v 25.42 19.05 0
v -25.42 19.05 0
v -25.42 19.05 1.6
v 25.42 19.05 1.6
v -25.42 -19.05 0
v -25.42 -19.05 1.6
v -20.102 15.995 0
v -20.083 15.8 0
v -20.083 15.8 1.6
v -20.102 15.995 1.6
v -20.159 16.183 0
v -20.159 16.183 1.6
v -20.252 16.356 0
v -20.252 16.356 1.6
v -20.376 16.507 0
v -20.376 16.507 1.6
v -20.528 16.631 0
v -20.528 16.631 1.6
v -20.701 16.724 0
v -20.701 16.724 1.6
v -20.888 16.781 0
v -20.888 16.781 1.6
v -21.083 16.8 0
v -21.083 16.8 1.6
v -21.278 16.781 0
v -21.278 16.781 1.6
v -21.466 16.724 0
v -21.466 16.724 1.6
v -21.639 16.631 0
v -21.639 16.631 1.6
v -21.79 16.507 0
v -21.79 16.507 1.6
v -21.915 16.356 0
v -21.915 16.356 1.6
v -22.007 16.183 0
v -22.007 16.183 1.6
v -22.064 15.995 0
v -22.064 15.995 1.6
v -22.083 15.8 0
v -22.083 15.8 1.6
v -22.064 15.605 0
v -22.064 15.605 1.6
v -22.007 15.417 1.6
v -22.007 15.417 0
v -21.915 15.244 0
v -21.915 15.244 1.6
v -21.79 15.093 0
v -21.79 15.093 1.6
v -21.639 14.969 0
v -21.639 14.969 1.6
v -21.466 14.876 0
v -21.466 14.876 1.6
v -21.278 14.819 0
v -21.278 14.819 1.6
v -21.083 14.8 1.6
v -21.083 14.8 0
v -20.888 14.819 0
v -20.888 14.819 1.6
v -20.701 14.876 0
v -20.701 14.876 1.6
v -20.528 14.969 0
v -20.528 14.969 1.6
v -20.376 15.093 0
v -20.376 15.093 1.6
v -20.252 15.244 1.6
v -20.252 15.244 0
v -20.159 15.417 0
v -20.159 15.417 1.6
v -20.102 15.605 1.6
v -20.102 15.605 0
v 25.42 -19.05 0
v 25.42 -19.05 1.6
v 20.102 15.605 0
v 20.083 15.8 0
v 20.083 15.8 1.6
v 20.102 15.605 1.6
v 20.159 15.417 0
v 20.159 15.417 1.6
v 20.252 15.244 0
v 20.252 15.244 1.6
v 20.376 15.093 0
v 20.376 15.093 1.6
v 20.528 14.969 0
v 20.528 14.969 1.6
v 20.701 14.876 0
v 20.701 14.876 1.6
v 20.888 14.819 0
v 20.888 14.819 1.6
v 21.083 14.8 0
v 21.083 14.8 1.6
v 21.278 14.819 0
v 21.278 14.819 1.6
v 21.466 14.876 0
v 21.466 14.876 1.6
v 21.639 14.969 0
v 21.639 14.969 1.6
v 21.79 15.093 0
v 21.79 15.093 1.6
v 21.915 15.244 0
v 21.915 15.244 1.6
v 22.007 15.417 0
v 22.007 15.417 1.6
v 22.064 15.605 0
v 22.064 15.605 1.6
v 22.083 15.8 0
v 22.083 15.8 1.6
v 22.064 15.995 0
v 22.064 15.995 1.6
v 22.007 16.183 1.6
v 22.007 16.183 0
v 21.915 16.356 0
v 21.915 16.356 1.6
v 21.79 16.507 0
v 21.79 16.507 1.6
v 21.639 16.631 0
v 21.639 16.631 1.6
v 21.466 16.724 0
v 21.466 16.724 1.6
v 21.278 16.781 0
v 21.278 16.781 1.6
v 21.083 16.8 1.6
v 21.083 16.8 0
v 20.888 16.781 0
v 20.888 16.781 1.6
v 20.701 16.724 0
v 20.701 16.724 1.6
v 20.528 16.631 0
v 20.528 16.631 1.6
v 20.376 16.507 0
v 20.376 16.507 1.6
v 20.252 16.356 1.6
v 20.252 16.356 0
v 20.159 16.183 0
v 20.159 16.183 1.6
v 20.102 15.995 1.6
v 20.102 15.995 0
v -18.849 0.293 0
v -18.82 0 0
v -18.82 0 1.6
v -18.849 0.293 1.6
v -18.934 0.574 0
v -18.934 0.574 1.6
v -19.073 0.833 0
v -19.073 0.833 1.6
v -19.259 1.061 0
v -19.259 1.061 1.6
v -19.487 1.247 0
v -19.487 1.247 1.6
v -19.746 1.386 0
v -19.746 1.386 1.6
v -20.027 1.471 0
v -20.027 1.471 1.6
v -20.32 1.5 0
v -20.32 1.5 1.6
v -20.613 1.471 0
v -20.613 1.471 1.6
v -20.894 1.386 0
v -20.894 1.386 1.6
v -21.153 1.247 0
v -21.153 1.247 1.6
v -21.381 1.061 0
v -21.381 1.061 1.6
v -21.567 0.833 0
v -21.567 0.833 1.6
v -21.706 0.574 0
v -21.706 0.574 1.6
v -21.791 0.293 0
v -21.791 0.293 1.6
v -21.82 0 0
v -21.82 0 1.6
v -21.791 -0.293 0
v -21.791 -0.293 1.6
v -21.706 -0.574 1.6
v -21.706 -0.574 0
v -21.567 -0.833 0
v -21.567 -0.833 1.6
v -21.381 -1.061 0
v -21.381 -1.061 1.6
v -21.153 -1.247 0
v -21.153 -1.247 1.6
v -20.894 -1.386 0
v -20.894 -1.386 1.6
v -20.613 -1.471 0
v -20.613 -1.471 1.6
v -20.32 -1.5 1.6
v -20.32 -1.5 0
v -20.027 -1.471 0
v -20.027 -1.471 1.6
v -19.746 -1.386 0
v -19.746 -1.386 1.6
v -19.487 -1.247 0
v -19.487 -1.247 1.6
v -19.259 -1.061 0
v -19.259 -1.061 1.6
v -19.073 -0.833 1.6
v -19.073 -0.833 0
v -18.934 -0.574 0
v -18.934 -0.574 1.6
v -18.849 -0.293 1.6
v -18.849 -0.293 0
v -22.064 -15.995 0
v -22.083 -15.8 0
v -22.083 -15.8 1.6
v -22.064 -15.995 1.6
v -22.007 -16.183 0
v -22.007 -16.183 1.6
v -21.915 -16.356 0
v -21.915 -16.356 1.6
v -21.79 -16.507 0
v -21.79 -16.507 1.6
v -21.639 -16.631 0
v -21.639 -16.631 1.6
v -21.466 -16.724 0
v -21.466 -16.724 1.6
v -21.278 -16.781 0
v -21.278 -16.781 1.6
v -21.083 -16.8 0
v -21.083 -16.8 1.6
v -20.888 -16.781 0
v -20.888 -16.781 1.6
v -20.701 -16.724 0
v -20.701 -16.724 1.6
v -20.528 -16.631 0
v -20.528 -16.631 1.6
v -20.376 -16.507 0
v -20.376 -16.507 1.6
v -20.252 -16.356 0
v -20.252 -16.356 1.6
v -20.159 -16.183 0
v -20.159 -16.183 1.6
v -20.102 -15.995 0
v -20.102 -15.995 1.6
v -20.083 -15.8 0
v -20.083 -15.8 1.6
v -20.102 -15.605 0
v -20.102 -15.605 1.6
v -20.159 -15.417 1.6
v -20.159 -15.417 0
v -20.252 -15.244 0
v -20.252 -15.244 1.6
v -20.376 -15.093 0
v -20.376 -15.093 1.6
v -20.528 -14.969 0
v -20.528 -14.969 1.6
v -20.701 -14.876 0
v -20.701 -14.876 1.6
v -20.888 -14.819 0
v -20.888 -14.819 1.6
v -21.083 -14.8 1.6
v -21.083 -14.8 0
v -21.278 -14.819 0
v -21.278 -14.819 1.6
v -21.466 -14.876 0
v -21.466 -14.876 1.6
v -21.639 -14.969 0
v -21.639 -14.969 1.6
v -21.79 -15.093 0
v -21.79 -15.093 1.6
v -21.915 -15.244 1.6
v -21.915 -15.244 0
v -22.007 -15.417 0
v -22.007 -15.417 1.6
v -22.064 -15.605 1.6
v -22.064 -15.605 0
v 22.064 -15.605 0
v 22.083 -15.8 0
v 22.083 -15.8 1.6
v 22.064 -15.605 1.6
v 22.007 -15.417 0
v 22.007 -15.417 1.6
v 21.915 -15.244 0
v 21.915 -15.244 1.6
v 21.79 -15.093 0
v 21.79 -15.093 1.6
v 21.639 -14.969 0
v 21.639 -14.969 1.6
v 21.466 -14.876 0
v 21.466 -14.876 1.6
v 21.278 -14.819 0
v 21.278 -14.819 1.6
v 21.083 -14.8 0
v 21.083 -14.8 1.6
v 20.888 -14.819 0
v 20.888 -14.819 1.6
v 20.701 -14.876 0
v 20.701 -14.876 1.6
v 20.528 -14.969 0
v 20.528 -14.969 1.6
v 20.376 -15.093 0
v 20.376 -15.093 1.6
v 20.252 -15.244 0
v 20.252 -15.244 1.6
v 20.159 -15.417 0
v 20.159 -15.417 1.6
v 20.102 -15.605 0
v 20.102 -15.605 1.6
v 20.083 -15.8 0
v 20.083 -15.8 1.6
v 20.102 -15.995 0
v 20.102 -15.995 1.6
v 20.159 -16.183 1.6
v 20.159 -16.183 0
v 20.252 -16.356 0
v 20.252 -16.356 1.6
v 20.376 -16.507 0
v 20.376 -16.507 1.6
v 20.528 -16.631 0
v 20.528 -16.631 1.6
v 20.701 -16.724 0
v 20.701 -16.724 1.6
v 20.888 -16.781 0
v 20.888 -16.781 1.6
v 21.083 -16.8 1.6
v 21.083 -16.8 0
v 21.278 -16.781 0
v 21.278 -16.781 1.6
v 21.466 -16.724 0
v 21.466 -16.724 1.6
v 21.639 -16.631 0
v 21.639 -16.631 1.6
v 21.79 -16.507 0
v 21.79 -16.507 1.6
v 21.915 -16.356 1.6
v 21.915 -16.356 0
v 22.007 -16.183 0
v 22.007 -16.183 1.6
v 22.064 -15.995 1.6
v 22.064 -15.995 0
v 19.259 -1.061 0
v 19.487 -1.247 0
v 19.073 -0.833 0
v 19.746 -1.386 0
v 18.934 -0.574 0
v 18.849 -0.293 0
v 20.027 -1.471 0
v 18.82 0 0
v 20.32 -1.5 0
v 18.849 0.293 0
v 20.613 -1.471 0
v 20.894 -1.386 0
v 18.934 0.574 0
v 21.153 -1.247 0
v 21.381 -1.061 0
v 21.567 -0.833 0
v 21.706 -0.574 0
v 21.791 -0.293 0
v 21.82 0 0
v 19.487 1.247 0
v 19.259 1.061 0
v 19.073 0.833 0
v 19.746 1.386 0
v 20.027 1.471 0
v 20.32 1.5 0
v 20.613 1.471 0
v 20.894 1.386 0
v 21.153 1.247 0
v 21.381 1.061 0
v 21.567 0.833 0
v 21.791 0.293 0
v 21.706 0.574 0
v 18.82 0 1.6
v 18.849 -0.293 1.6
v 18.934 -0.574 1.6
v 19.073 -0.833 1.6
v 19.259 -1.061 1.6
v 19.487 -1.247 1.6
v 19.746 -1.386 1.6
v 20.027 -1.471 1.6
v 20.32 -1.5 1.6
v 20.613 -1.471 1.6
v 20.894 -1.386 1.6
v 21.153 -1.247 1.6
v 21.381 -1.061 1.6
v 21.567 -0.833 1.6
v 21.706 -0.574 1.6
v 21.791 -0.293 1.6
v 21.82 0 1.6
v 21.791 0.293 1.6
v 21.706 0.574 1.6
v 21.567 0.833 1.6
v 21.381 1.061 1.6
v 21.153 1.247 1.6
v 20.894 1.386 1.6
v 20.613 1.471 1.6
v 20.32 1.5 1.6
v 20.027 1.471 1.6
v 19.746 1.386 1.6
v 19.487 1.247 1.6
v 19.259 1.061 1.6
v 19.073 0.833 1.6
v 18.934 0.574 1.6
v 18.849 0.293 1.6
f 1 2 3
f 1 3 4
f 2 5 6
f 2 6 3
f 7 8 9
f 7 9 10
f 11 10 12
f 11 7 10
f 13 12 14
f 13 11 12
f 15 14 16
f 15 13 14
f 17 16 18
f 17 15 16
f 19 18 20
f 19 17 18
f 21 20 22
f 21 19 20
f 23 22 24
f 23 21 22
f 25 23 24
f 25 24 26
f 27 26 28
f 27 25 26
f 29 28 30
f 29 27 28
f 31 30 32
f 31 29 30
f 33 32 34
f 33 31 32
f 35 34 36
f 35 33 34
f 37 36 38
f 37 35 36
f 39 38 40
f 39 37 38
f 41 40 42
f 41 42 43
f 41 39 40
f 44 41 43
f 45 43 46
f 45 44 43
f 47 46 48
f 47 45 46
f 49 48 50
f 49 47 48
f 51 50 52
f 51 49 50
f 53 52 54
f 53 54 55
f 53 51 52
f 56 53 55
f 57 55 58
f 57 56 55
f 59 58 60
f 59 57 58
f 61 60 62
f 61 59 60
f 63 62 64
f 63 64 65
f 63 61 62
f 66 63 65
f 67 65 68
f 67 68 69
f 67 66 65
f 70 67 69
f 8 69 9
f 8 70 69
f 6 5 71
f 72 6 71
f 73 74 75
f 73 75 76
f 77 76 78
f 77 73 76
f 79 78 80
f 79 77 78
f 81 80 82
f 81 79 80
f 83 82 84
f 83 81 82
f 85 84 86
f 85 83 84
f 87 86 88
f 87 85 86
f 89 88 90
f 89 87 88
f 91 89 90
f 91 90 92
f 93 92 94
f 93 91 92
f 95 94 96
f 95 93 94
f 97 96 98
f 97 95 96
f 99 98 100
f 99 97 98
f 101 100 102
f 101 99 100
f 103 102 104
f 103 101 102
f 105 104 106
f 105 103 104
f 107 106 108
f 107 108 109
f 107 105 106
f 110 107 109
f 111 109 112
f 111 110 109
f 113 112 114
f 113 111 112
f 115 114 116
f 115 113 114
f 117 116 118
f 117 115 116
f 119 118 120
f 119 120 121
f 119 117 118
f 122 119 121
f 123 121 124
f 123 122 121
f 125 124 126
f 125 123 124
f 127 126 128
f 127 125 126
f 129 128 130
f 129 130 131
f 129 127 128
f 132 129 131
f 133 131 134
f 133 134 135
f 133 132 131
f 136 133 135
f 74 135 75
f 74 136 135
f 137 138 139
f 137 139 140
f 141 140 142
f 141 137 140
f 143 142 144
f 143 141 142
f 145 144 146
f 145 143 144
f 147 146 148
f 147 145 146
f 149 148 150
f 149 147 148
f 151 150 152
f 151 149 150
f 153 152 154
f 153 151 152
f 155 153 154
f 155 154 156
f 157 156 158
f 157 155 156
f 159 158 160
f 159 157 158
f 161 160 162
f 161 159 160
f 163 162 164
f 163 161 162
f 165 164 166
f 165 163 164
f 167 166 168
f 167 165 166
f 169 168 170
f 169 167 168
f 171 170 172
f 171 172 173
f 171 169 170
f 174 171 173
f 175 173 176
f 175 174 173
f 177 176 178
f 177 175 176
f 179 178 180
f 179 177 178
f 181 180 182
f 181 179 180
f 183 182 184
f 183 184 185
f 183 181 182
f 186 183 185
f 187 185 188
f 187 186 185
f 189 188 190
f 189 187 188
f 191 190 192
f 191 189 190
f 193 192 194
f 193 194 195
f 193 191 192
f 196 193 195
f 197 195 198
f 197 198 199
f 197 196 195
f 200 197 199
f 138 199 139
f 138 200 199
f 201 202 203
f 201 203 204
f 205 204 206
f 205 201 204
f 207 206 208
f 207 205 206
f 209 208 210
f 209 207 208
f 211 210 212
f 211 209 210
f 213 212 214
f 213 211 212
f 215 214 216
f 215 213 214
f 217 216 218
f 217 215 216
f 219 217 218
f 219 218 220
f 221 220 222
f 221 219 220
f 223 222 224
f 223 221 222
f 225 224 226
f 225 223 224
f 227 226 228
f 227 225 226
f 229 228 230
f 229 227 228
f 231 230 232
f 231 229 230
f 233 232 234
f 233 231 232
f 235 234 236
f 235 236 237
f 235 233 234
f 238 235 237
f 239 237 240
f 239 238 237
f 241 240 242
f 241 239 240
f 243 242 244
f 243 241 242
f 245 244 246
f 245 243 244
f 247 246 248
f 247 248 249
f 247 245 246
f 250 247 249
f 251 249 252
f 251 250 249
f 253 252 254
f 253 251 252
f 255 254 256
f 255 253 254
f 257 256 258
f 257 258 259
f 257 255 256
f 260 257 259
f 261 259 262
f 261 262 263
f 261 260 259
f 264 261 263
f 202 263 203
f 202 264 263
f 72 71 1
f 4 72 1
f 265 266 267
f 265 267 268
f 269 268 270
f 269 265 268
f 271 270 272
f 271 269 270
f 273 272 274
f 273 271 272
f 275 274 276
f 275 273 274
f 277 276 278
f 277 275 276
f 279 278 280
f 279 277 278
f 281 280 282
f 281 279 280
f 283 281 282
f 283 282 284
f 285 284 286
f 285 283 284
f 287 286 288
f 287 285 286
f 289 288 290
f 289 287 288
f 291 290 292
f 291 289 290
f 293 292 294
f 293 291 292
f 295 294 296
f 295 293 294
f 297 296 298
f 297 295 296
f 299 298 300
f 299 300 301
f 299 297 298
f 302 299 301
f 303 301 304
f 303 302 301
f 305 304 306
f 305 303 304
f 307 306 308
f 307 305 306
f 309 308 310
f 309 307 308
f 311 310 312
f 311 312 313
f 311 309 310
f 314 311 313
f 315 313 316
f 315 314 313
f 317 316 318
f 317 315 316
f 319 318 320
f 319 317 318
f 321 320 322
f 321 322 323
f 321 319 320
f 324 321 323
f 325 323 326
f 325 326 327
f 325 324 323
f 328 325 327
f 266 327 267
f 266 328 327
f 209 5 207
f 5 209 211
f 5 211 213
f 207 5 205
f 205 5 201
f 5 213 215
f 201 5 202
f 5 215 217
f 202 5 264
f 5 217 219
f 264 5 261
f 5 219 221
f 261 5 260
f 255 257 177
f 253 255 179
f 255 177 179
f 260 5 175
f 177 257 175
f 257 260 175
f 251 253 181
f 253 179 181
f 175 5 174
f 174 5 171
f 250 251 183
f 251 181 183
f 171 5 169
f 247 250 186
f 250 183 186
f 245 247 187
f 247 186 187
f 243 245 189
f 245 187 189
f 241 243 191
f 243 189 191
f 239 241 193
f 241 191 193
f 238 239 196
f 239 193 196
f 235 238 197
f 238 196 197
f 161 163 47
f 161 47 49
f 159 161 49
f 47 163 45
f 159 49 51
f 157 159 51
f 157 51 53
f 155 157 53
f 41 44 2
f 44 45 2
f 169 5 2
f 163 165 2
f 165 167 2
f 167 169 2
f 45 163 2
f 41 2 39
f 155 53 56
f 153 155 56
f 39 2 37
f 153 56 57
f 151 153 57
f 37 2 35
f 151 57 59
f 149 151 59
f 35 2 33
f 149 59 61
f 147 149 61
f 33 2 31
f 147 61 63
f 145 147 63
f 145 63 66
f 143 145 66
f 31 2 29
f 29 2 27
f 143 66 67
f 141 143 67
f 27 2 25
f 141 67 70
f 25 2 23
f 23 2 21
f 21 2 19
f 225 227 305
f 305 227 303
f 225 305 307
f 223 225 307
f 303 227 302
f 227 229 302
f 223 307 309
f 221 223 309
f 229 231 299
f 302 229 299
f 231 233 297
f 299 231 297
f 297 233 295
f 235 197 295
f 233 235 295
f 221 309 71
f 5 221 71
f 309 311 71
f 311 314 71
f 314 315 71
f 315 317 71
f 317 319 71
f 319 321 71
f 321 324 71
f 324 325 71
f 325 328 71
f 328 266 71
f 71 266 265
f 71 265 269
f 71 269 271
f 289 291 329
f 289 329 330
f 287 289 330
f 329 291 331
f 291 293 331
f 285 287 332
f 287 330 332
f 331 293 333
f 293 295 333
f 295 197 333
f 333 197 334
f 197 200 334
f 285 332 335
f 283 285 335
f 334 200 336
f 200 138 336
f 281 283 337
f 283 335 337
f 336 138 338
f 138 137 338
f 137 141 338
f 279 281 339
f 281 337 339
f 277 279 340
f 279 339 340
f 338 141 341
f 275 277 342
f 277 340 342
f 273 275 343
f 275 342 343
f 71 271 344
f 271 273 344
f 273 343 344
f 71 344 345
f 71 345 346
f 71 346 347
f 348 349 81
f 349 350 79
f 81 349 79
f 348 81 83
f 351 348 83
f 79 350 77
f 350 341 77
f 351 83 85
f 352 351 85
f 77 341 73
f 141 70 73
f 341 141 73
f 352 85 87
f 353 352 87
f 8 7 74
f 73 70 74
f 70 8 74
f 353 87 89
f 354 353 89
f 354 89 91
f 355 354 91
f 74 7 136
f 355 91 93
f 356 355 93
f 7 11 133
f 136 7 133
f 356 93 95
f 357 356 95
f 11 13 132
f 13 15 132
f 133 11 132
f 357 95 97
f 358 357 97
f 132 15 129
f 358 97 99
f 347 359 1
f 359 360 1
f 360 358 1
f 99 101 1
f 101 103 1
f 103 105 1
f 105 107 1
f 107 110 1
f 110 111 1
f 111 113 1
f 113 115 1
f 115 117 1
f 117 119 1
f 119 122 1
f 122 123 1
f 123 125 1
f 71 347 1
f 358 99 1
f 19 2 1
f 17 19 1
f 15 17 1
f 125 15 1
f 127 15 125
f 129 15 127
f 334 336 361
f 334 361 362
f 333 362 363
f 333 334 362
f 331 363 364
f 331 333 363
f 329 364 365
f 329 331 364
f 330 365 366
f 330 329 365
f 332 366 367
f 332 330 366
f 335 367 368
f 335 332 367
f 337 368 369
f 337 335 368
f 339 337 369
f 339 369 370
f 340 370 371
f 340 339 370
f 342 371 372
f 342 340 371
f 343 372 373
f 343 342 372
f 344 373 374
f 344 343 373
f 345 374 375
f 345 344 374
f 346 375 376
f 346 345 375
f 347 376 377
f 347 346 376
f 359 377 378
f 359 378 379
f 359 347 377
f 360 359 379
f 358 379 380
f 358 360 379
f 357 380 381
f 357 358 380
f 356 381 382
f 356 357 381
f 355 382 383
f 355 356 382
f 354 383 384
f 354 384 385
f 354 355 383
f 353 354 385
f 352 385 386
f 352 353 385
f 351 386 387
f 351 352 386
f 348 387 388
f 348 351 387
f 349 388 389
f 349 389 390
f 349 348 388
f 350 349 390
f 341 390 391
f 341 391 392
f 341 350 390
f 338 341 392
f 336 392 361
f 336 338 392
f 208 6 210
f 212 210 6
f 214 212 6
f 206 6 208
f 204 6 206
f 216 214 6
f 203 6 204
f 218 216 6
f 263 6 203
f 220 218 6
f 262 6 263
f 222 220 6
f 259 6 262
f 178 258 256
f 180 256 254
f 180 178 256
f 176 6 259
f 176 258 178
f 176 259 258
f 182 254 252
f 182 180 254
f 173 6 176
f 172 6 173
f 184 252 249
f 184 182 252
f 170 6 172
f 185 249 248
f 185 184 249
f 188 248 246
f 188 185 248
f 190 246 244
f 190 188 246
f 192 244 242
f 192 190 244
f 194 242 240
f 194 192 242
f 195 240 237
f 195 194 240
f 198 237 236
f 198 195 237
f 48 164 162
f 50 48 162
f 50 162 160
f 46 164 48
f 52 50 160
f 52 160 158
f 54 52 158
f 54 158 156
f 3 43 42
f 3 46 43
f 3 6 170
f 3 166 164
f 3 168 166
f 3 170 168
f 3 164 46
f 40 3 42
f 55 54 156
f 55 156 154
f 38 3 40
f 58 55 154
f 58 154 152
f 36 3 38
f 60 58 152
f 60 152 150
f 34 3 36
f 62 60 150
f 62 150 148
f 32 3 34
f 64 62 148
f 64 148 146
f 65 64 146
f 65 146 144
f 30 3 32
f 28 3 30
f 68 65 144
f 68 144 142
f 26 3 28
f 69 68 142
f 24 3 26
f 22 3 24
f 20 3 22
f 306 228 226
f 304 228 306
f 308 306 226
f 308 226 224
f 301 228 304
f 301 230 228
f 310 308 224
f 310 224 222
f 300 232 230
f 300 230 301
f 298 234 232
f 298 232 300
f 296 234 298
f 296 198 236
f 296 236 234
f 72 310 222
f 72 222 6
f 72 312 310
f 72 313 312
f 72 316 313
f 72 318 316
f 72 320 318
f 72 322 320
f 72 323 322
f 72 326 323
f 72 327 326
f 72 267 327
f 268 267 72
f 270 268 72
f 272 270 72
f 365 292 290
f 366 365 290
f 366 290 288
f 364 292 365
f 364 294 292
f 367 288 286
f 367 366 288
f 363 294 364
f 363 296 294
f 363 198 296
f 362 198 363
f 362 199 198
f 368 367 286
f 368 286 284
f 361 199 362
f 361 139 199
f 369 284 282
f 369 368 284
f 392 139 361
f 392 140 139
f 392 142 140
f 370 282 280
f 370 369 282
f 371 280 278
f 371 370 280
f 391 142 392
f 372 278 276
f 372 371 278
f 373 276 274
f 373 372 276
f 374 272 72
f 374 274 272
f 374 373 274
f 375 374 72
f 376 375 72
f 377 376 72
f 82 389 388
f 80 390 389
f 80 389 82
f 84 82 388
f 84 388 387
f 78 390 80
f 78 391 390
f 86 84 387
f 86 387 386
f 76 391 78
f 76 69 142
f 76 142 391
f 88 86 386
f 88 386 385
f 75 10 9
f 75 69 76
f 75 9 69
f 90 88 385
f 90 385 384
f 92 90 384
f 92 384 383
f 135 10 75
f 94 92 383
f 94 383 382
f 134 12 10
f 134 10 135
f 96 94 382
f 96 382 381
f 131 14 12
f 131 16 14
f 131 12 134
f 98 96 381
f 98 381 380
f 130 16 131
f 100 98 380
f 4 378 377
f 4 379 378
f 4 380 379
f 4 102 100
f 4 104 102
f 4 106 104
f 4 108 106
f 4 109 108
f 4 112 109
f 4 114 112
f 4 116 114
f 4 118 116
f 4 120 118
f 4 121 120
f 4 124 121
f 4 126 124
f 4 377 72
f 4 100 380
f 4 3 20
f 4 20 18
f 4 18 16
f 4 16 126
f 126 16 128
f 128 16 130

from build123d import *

# Parameters (mm, degrees)
SKETCH1_W           = 50.84
SKETCH1_H           = 38.1
SKETCH1_R           = 1
SKETCH1_R_2         = 1.5
BOSS_EXTRUDE1_DEPTH = 1.6


with BuildPart() as part:
    # Sketch1 → Boss-Extrude1 (new body)
    with BuildSketch(Plane.XY):
        Rectangle(SKETCH1_W, SKETCH1_H)
        with Locations((-21.083254593, 15.8)):
            Circle(SKETCH1_R, mode=Mode.SUBTRACT)
        with Locations(Location((21.083254593, 15.8, 0), (0, 0, 180))):
            Circle(SKETCH1_R, mode=Mode.SUBTRACT)
        with Locations((21.083254593, -15.8)):
            Circle(SKETCH1_R, mode=Mode.SUBTRACT)
        with Locations(Location((-21.083254593, -15.8, 0), (0, 0, 180))):
            Circle(SKETCH1_R, mode=Mode.SUBTRACT)
        with Locations((-20.32, 0)):
            Circle(SKETCH1_R_2, mode=Mode.SUBTRACT)
        with Locations(Location((20.32, 0, 0), (0, 0, 180))):
            Circle(SKETCH1_R_2, mode=Mode.SUBTRACT)
    extrude(amount=BOSS_EXTRUDE1_DEPTH)


solid = part.part
